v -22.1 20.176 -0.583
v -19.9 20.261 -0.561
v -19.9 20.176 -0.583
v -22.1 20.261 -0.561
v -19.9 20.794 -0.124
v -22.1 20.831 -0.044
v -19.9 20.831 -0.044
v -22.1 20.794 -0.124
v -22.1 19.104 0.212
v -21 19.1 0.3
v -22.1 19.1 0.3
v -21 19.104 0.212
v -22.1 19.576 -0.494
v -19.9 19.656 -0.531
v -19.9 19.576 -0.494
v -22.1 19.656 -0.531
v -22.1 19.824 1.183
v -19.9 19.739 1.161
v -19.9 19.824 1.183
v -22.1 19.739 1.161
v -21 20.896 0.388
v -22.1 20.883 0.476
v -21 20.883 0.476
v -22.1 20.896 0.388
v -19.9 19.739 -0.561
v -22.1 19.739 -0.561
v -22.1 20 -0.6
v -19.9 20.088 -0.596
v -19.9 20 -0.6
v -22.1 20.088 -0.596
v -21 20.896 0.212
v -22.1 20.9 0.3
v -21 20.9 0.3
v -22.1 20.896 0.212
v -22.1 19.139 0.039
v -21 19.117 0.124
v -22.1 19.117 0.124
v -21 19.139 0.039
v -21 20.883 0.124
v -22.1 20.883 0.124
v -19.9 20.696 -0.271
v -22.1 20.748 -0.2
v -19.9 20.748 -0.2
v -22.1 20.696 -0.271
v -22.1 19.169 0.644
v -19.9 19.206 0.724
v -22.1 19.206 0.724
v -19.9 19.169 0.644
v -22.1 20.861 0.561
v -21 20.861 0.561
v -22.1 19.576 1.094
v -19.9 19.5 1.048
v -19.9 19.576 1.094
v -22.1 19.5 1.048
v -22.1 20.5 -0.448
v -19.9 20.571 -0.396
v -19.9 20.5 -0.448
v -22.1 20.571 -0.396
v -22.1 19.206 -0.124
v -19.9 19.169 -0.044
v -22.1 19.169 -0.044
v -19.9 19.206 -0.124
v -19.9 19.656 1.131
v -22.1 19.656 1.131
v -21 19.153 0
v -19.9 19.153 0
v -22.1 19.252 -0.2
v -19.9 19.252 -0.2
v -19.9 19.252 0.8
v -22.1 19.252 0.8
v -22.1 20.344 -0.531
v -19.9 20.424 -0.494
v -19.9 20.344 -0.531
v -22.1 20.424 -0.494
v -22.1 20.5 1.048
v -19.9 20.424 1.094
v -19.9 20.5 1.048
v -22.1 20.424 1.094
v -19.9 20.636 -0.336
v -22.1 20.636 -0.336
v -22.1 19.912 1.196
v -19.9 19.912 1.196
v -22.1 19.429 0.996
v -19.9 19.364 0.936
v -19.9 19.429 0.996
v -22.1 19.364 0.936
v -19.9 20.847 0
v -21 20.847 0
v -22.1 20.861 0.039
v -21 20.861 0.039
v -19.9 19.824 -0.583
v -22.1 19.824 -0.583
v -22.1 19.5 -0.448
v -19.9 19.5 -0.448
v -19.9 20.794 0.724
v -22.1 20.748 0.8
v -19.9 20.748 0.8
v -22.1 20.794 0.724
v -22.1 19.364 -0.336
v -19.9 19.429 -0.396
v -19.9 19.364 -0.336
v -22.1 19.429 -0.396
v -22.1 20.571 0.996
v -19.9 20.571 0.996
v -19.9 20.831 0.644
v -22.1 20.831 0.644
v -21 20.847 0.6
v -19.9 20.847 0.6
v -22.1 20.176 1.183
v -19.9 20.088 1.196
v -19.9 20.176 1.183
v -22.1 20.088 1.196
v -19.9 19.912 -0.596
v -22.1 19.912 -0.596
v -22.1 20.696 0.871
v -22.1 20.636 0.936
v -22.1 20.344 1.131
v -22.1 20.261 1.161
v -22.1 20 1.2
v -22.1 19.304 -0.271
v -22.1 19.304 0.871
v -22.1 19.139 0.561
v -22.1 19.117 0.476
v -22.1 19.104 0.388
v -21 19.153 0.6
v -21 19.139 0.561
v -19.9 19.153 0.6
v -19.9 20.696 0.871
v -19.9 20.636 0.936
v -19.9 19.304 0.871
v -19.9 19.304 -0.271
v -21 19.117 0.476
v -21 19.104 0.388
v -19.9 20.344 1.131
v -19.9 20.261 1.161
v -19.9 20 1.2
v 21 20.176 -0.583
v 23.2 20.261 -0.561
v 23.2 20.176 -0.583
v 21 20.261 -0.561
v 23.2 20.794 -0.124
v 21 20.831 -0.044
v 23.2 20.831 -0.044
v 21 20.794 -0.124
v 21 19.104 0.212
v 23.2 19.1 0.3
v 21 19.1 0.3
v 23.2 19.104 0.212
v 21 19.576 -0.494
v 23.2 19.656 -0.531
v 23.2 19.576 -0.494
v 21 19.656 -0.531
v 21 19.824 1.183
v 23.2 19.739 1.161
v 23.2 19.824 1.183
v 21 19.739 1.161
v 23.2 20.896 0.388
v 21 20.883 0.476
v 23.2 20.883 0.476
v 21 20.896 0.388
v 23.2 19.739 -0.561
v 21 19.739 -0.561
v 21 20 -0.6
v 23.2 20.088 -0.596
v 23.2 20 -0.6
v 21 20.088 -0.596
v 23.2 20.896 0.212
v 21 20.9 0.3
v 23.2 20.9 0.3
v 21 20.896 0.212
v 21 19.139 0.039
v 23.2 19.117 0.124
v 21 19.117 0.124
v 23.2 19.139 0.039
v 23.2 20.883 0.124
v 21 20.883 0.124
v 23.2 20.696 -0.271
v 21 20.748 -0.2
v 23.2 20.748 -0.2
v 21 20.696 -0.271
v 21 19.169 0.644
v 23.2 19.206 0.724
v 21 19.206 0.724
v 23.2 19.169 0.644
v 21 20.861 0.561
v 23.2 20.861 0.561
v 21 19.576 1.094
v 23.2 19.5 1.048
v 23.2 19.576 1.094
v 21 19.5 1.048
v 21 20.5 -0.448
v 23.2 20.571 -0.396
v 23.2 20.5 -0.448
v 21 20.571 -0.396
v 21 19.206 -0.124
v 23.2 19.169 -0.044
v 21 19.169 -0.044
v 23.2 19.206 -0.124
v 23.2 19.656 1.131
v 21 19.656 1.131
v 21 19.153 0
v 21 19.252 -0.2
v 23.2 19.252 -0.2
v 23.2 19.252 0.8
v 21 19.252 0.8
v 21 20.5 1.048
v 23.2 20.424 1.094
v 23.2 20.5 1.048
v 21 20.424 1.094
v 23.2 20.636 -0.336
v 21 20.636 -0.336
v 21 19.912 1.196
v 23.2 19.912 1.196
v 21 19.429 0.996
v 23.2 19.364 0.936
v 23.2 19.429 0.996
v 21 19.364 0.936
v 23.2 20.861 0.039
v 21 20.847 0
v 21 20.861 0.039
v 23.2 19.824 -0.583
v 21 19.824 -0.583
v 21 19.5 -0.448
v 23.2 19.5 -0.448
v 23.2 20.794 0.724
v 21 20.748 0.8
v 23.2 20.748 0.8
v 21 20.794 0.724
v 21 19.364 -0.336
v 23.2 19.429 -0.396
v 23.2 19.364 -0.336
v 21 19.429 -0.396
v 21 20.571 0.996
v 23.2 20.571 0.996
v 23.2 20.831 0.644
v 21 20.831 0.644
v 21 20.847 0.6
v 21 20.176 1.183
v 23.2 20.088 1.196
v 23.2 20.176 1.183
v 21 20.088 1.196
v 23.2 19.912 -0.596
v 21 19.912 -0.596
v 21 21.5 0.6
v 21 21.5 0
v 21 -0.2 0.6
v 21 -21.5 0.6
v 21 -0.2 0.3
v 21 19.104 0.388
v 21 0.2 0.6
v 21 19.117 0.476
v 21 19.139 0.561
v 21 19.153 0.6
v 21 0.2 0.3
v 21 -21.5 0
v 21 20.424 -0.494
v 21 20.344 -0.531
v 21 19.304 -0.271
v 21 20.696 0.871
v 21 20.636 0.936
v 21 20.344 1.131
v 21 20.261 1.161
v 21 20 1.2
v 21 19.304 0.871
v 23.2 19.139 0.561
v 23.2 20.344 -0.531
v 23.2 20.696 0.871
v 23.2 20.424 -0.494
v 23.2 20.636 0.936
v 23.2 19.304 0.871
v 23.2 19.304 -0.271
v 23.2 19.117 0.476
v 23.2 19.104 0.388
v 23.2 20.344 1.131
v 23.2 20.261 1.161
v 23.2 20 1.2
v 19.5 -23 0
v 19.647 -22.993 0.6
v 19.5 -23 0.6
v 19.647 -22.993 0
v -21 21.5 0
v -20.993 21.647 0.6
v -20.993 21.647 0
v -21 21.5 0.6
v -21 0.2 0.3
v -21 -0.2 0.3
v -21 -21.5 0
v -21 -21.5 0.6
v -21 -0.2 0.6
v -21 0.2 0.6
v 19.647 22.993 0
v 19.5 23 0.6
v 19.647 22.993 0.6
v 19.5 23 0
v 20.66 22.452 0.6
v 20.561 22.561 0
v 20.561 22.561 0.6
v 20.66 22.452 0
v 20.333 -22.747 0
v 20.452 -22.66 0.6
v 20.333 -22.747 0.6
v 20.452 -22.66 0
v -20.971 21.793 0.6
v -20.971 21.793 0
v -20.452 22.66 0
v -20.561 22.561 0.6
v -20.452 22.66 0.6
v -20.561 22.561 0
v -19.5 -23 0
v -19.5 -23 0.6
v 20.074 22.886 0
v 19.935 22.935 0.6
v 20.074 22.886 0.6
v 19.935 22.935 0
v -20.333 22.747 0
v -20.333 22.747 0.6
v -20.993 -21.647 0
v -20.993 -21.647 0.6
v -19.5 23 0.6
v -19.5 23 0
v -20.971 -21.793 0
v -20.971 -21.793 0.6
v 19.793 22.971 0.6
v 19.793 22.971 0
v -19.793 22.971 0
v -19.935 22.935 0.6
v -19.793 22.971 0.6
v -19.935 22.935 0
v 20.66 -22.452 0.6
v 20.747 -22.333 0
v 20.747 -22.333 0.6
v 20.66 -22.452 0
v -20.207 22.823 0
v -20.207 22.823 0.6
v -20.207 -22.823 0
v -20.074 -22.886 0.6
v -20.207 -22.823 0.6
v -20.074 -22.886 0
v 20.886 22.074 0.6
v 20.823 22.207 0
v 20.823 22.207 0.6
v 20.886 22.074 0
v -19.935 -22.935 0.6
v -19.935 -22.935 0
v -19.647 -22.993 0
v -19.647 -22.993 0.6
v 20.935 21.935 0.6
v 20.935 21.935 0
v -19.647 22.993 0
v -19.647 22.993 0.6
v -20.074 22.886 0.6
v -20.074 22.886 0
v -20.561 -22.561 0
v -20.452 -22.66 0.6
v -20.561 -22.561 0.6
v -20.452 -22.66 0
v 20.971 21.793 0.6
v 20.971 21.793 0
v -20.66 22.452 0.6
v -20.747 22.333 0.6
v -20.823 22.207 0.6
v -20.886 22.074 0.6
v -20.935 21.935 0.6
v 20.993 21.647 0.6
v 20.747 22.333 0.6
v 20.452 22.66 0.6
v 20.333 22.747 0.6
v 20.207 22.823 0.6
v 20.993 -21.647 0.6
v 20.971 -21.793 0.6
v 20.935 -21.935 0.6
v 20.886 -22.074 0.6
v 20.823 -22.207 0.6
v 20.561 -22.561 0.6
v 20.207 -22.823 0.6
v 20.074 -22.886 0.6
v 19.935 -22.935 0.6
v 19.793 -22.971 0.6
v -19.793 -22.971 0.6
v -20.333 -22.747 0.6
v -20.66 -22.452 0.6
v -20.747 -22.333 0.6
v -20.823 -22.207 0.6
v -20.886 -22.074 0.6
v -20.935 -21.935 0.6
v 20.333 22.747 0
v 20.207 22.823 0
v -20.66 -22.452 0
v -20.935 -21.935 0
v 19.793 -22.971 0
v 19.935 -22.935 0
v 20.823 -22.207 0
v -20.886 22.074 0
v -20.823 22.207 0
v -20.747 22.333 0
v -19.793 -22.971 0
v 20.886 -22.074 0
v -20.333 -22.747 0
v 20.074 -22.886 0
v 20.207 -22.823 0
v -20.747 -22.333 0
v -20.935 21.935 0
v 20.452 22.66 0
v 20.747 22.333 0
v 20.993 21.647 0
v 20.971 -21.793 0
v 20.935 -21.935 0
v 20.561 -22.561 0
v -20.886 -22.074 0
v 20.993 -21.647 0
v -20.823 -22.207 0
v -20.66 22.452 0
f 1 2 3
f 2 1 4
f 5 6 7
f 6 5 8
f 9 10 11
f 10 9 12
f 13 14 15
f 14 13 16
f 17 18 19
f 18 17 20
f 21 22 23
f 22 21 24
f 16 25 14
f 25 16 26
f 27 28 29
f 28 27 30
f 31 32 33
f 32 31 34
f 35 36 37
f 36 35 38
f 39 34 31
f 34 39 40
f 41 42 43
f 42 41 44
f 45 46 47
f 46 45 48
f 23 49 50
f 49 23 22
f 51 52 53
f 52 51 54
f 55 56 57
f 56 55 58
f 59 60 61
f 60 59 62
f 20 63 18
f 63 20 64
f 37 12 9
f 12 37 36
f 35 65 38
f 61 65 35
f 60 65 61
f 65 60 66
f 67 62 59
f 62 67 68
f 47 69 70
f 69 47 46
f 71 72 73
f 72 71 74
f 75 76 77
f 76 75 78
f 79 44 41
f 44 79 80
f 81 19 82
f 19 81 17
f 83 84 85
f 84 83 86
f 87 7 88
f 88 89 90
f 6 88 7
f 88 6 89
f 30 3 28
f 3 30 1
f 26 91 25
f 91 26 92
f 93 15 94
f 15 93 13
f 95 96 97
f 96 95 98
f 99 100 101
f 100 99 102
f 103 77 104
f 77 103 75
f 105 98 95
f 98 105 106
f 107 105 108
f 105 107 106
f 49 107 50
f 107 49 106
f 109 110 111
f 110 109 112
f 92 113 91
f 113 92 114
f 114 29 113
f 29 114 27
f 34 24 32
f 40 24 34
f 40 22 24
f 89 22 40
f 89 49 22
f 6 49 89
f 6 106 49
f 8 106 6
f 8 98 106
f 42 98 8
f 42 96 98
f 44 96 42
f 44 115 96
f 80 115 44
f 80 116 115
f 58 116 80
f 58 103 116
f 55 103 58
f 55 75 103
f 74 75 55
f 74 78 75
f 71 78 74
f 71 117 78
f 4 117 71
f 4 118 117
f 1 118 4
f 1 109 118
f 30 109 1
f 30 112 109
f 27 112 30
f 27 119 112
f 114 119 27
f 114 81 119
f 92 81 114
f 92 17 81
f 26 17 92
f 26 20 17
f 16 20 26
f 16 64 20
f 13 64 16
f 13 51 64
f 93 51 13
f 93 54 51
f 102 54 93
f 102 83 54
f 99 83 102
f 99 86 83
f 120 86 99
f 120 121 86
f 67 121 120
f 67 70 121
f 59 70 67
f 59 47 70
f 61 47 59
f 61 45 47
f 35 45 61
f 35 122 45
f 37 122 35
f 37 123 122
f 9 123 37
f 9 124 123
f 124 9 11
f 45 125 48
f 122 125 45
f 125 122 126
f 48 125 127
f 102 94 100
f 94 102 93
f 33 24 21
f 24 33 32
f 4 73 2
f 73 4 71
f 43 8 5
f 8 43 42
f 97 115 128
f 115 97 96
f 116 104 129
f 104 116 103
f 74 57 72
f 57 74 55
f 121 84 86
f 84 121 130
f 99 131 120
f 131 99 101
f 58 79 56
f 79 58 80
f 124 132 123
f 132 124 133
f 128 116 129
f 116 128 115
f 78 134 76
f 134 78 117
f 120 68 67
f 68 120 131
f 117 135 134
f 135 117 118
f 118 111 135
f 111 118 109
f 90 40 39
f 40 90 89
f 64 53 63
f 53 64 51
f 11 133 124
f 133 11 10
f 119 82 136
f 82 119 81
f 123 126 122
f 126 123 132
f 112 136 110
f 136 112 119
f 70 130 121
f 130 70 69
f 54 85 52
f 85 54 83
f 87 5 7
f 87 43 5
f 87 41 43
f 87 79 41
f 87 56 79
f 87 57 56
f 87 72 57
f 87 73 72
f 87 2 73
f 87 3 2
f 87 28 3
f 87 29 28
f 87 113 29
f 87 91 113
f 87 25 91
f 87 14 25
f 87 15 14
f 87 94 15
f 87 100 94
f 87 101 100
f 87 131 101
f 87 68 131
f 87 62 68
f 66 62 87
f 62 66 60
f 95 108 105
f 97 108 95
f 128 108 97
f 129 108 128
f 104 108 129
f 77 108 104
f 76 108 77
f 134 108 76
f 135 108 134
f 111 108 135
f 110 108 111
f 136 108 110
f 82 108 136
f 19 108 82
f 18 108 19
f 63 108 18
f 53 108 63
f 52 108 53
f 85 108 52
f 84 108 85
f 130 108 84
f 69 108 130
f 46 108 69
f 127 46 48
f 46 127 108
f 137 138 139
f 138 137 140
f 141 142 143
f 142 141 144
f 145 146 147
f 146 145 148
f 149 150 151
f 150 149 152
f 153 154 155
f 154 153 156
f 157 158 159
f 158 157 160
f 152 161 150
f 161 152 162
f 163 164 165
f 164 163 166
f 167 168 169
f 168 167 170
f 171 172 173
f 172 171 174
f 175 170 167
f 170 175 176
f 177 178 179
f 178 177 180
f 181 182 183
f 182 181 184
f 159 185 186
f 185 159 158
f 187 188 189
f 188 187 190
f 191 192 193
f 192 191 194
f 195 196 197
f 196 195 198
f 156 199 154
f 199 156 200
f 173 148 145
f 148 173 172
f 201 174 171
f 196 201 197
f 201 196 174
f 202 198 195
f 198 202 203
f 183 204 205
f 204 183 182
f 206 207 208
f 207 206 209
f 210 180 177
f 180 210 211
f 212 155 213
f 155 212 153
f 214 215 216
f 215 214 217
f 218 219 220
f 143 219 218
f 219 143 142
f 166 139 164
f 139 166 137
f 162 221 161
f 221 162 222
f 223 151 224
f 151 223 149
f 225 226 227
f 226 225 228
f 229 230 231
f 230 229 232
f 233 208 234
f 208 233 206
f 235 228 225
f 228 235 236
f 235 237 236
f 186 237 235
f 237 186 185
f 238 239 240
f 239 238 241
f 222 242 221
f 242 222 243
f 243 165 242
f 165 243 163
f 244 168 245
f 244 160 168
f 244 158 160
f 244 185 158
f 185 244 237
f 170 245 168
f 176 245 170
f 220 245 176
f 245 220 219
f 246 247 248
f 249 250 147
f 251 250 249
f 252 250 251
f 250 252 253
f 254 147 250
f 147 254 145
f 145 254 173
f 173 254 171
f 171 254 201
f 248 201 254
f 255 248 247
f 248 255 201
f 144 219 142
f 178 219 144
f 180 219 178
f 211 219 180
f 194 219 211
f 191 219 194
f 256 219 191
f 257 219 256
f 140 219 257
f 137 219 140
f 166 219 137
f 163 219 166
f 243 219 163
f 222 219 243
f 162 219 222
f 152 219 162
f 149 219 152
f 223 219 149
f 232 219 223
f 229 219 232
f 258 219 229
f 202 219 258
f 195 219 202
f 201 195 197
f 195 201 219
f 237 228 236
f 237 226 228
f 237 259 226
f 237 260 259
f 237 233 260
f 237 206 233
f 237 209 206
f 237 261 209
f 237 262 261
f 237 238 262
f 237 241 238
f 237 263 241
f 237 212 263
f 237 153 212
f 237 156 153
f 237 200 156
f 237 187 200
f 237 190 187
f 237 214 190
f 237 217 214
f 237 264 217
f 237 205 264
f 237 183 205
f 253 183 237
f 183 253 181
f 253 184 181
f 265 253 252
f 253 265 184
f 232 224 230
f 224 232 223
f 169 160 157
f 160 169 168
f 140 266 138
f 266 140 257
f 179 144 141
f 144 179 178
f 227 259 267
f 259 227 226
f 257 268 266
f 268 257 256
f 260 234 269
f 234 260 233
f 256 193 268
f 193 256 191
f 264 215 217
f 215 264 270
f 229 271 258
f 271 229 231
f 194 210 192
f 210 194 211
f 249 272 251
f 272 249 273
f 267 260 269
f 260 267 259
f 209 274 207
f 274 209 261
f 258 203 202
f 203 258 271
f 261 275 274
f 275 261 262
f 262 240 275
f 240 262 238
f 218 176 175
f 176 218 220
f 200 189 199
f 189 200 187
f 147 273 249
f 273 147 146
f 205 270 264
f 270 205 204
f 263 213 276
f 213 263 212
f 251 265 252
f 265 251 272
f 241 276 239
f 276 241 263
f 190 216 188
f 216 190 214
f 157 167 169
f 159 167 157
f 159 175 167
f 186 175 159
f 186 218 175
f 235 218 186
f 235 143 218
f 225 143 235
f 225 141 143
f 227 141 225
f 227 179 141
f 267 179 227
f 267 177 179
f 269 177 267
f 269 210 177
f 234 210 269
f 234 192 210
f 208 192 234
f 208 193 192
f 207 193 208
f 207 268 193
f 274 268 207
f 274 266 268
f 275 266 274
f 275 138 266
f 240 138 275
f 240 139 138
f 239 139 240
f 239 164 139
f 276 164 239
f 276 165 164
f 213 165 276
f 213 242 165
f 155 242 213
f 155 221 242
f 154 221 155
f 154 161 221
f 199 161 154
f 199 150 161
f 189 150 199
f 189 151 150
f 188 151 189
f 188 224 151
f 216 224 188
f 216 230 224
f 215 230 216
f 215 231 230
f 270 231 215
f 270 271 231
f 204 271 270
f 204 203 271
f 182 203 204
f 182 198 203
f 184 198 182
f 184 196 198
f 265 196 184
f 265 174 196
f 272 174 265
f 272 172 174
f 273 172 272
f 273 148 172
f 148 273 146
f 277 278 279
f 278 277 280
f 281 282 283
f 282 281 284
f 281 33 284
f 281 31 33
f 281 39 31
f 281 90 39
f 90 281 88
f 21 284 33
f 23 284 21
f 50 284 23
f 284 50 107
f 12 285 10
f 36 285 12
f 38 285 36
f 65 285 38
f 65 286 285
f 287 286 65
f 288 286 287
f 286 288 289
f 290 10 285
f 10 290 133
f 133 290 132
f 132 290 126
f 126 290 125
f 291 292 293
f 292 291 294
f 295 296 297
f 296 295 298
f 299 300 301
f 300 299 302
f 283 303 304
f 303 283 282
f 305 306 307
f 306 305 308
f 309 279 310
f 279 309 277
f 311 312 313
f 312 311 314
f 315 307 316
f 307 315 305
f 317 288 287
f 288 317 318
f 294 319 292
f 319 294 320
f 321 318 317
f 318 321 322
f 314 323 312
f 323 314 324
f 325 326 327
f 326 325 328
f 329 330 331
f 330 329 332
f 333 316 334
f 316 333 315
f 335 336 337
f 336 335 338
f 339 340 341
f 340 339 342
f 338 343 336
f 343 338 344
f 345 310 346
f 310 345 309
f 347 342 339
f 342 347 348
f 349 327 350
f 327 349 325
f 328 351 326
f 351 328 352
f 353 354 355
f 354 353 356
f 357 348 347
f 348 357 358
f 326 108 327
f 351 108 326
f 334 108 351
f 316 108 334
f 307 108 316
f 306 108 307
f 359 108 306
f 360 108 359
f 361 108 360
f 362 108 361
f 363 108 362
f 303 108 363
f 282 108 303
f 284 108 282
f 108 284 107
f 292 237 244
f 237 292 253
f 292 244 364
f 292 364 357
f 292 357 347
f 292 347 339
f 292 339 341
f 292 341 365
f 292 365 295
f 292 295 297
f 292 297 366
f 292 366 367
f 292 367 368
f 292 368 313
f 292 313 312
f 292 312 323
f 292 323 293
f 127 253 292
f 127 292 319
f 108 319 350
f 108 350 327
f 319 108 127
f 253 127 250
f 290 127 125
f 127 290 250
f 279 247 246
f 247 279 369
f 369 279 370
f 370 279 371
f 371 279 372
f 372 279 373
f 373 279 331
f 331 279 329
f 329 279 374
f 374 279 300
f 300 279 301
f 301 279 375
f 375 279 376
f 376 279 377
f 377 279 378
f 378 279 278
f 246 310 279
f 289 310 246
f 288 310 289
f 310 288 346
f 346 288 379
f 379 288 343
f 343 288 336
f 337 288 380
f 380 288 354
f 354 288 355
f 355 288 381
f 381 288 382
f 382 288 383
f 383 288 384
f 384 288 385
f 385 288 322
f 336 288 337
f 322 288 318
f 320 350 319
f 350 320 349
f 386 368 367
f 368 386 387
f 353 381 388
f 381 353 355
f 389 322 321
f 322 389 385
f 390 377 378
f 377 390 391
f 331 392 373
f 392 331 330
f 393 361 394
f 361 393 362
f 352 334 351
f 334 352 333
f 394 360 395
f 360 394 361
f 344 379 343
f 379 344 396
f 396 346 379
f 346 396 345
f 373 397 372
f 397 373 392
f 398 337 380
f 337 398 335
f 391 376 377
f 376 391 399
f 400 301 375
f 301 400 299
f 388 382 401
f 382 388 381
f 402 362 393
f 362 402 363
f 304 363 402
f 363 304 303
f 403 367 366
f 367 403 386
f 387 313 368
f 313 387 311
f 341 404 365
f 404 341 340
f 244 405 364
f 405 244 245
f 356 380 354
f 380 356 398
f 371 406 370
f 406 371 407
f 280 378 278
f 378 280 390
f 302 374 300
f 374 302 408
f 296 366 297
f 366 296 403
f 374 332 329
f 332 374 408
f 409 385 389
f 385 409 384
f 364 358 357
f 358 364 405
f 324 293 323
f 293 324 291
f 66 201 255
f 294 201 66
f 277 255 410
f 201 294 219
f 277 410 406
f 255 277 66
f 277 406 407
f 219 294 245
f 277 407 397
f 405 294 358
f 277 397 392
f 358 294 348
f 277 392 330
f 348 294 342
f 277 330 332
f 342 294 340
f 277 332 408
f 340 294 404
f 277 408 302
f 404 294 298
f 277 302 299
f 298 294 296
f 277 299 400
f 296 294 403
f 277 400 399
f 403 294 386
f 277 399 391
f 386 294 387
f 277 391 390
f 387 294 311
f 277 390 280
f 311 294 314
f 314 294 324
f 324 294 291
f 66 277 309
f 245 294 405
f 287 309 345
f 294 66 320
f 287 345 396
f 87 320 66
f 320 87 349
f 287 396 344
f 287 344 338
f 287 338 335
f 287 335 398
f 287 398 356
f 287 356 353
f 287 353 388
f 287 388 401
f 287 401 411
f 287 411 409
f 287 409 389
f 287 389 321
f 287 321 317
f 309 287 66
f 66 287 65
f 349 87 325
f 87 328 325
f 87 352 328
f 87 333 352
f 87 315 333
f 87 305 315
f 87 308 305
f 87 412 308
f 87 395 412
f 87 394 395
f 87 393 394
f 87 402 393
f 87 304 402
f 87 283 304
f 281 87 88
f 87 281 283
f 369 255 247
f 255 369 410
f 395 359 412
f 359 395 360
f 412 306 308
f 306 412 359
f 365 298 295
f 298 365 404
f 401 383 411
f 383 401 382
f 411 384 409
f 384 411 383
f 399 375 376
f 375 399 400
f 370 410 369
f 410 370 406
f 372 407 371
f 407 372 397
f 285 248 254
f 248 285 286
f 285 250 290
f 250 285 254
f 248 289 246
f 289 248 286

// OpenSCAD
// file: params.scad
// ============================================================
// params.scad — every tunable dimension for the split-flap build.
// Units: millimetres. Import this from module.scad / enclosure.scad.
//
// The three numbers you actually tune for YOUR printer are the
// *_CLEARANCE values near the bottom. Everything else is geometry.
// ============================================================

// ---- character / flap geometry ----
FLAP_COUNT      = 48;      // flaps on the drum (matches charset.json)
FLAP_W          = 42;      // printed flap width  (visible glyph area a touch narrower)
FLAP_H          = 46;      // printed flap height (top+bottom halves together)
FLAP_T          = 0.6;     // flap material thickness (0.5mm PET / sticker card)
FLAP_PIN_D      = 1.8;     // diameter of the two side pins that ride the drum slots
FLAP_PIN_L      = 2.2;     // how far each pin sticks out per side

// ---- drum (the two slotted spools the flaps clip into) ----
// Radius is derived so FLAP_COUNT flaps sit evenly around the circle.
DRUM_SLOT_PITCH = 360 / FLAP_COUNT;          // angular pitch between flaps (deg)
DRUM_R          = (FLAP_H/2) / sin(DRUM_SLOT_PITCH/2) * 0.86; // pack radius
DRUM_WALL       = 2.0;
DRUM_SPOKES     = 6;
SHAFT_D         = 5.0;     // 5 mm steel rod through the drum
SHAFT_FLAT      = 0.5;     // D-flat depth so the drum keys to a filed shaft

// ---- module body ----
MODULE_W        = FLAP_W + 8;    // interior width (flap + side walls clearance)
MODULE_H        = 66;            // front bezel height of one unit
MODULE_D        = 62;            // depth front-to-back (drum + motor stack)
WALL            = 2.4;           // printed wall thickness of the module body

// ---- motor: 28BYJ-48 + ULN2003 ----
MOTOR_BODY_D    = 28.25;   // stepper body diameter
MOTOR_BOSS_D    = 9.2;     // centre boss around the shaft
MOTOR_SHAFT_D   = 5.0;     // 5 mm flatted output shaft (couples to drum)
MOTOR_MOUNT_W   = 35.0;    // centre-to-centre of the two M3 mount tabs
MOTOR_TAB_H     = 7.0;
MOTOR_M3_D      = 3.2;

// ---- hall sensor + home magnet ----
HALL_PCB_W      = 12.0;    // small hall-sensor breakout footprint
HALL_PCB_H      = 15.0;
MAGNET_D        = 4.0;     // 4x2 mm neodymium disc pressed into the drum hub
MAGNET_T        = 2.0;

// ---- front acrylic window (optional clean face) ----
ACRYLIC_T       = 2.0;
WINDOW_W        = FLAP_W - 2;
WINDOW_H        = FLAP_H - 4;

// ---- enclosure grid ----
ROWS            = 4;
COLS            = 16;
MODULE_PITCH_X  = MODULE_W + 2*WALL + 1.0;   // horizontal centre spacing
MODULE_PITCH_Y  = MODULE_H + 3.0;            // vertical centre spacing
BEZEL           = 6;       // black frame border around the whole array
PANEL_GAP       = 0.4;     // gap between neighbouring bezels (dual-color seam)

// ---- print tolerances (TUNE THESE for your Bambu + filament) ----
// Print hardware/openscad/fit_test.scad first and dial these in.
FIT_LOOSE       = 0.30;    // rotating / sliding fits (drum on shaft holder)
FIT_SNUG        = 0.15;    // press / clip fits (flap pins, bearing seats)
BEARING_OD      = 16.0;    // 608 bearing OD (optional, for a smoother drum)
BEARING_ID      = 8.0;
BEARING_T       = 7.0;

$fn = 64;
// main file
// ============================================================
// module.scad — the split-flap MECHANISM (parametric starter).
//
// >>> READ THIS FIRST <<<
// A split-flap drum is a tolerance-critical mechanism. This file is a
// fully-parametric STARTING POINT, not a guaranteed print. Plan on 1-2
// test iterations of the spool<->flap fit on YOUR printer/filament
// before a drum flips cleanly. If you want zero iteration, print the
// community-proven module linked in docs/00-build-guide.md and use this
// only to regenerate flaps or resize the set.
//
// Parts (render one at a time, then arrange on the plate):
//   flap();            // x FLAP_COUNT — the cards
//   spool();           // x2 per module (mirror for the second)
//   motor_mount();     // holds the 28BYJ-48
//   sensor_mount();    // holds the hall breakout + defines home
//   side_a(); side_b();// the two body sides that carry the shaft
// ============================================================
include <params.scad>

// ---------- FLAP ----------
// A rectangular card. Two pins on the upper edge ride the spool slots.
// The horizontal centre line is where the physical fold/split sits.
module flap() {
    difference() {
        union() {
            // card body
            linear_extrude(FLAP_T)
                offset(r=1.5) offset(delta=-1.5)
                    square([FLAP_W, FLAP_H], center=true);
            // side pins
            for (s=[-1,1])
                translate([s*(FLAP_W/2), FLAP_H/2 - 3, FLAP_T/2])
                    rotate([0,90,0])
                        cylinder(h=FLAP_PIN_L, d=FLAP_PIN_D, center=(s<0));
        }
        // thin score line at the split so the printed flap folds crisply
        translate([0,0,FLAP_T])
            cube([FLAP_W+2, 0.4, FLAP_T], center=true);
    }
}

// ---------- SPOOL ----------
// A disc with FLAP_COUNT slots around the rim to capture flap pins,
// a keyed shaft bore, and a magnet pocket for homing.
module spool() {
    difference() {
        union() {
            // rim
            linear_extrude(DRUM_WALL) circle(r=DRUM_R);
            // hub
            cylinder(h=8, d=SHAFT_D+6);
            // spokes
            for (i=[0:DRUM_SPOKES-1]) rotate([0,0,i*360/DRUM_SPOKES])
                translate([0,-1.2,0]) cube([DRUM_R, 2.4, DRUM_WALL]);
        }
        // slots for flap pins around the rim
        for (i=[0:FLAP_COUNT-1]) rotate([0,0,i*DRUM_SLOT_PITCH])
            translate([DRUM_R-1.5, 0, -0.1])
                cylinder(h=DRUM_WALL+0.2, d=FLAP_PIN_D + 2*FIT_LOOSE);
        // keyed shaft bore (D-flat)
        translate([0,0,-0.1]) difference() {
            cylinder(h=10, d=SHAFT_D + 2*FIT_LOOSE);
            translate([SHAFT_D/2 - SHAFT_FLAT, -SHAFT_D, 0]) cube([SHAFT_D, 2*SHAFT_D, 20]);
        }
        // magnet pocket in the hub face (homing)
        translate([DRUM_R*0.45, 0, DRUM_WALL - MAGNET_T + 0.01])
            cylinder(h=MAGNET_T+1, d=MAGNET_D + 2*FIT_SNUG);
    }
}

// ---------- MOTOR MOUNT (28BYJ-48) ----------
module motor_mount() {
    difference() {
        cube([MOTOR_BODY_D+2*WALL, MOTOR_BODY_D+2*WALL, WALL], center=true);
        // body clearance
        cylinder(h=WALL*3, d=MOTOR_BODY_D + 2*FIT_LOOSE, center=true);
        // shaft boss
        cylinder(h=WALL*3, d=MOTOR_BOSS_D + 2*FIT_LOOSE, center=true);
        // M3 mount holes
        for (s=[-1,1]) translate([s*MOTOR_MOUNT_W/2, 0, 0])
            cylinder(h=WALL*3, d=MOTOR_M3_D, center=true);
    }
}

// ---------- SENSOR MOUNT ----------
module sensor_mount() {
    difference() {
        cube([HALL_PCB_W+2*WALL, HALL_PCB_H+2*WALL, WALL+4], center=true);
        translate([0,0,2]) cube([HALL_PCB_W+2*FIT_LOOSE, HALL_PCB_H+2*FIT_LOOSE, 6], center=true);
    }
}

// ---------- BODY SIDES ----------
// Two plates that sandwich the drum, carry the shaft, motor and sensor.
module side_a() { _side(mirror_motor=false); }
module side_b() { _side(mirror_motor=true); }
module _side(mirror_motor) {
    difference() {
        // plate
        linear_extrude(WALL)
            offset(r=3) offset(delta=-3)
                square([MODULE_D, MODULE_H], center=true);
        // shaft bore (or bearing seat)
        translate([-MODULE_D/2 + DRUM_R + 4, 0, 0])
            cylinder(h=WALL*3, d = (mirror_motor ? BEARING_OD+2*FIT_SNUG : SHAFT_D+2*FIT_LOOSE), center=true);
    }
    // motor boss on side_b
    if (mirror_motor)
        translate([-MODULE_D/2 + DRUM_R + 4, 0, WALL])
            difference() {
                cylinder(h=6, d=MOTOR_BOSS_D+2*WALL);
                cylinder(h=20, d=MOTOR_SHAFT_D+2*FIT_LOOSE, center=true);
            }
}

// ---- pick ONE to render / export as STL ----
flap();
// spool();
// motor_mount();
// sensor_mount();
// side_a();
// side_b();
